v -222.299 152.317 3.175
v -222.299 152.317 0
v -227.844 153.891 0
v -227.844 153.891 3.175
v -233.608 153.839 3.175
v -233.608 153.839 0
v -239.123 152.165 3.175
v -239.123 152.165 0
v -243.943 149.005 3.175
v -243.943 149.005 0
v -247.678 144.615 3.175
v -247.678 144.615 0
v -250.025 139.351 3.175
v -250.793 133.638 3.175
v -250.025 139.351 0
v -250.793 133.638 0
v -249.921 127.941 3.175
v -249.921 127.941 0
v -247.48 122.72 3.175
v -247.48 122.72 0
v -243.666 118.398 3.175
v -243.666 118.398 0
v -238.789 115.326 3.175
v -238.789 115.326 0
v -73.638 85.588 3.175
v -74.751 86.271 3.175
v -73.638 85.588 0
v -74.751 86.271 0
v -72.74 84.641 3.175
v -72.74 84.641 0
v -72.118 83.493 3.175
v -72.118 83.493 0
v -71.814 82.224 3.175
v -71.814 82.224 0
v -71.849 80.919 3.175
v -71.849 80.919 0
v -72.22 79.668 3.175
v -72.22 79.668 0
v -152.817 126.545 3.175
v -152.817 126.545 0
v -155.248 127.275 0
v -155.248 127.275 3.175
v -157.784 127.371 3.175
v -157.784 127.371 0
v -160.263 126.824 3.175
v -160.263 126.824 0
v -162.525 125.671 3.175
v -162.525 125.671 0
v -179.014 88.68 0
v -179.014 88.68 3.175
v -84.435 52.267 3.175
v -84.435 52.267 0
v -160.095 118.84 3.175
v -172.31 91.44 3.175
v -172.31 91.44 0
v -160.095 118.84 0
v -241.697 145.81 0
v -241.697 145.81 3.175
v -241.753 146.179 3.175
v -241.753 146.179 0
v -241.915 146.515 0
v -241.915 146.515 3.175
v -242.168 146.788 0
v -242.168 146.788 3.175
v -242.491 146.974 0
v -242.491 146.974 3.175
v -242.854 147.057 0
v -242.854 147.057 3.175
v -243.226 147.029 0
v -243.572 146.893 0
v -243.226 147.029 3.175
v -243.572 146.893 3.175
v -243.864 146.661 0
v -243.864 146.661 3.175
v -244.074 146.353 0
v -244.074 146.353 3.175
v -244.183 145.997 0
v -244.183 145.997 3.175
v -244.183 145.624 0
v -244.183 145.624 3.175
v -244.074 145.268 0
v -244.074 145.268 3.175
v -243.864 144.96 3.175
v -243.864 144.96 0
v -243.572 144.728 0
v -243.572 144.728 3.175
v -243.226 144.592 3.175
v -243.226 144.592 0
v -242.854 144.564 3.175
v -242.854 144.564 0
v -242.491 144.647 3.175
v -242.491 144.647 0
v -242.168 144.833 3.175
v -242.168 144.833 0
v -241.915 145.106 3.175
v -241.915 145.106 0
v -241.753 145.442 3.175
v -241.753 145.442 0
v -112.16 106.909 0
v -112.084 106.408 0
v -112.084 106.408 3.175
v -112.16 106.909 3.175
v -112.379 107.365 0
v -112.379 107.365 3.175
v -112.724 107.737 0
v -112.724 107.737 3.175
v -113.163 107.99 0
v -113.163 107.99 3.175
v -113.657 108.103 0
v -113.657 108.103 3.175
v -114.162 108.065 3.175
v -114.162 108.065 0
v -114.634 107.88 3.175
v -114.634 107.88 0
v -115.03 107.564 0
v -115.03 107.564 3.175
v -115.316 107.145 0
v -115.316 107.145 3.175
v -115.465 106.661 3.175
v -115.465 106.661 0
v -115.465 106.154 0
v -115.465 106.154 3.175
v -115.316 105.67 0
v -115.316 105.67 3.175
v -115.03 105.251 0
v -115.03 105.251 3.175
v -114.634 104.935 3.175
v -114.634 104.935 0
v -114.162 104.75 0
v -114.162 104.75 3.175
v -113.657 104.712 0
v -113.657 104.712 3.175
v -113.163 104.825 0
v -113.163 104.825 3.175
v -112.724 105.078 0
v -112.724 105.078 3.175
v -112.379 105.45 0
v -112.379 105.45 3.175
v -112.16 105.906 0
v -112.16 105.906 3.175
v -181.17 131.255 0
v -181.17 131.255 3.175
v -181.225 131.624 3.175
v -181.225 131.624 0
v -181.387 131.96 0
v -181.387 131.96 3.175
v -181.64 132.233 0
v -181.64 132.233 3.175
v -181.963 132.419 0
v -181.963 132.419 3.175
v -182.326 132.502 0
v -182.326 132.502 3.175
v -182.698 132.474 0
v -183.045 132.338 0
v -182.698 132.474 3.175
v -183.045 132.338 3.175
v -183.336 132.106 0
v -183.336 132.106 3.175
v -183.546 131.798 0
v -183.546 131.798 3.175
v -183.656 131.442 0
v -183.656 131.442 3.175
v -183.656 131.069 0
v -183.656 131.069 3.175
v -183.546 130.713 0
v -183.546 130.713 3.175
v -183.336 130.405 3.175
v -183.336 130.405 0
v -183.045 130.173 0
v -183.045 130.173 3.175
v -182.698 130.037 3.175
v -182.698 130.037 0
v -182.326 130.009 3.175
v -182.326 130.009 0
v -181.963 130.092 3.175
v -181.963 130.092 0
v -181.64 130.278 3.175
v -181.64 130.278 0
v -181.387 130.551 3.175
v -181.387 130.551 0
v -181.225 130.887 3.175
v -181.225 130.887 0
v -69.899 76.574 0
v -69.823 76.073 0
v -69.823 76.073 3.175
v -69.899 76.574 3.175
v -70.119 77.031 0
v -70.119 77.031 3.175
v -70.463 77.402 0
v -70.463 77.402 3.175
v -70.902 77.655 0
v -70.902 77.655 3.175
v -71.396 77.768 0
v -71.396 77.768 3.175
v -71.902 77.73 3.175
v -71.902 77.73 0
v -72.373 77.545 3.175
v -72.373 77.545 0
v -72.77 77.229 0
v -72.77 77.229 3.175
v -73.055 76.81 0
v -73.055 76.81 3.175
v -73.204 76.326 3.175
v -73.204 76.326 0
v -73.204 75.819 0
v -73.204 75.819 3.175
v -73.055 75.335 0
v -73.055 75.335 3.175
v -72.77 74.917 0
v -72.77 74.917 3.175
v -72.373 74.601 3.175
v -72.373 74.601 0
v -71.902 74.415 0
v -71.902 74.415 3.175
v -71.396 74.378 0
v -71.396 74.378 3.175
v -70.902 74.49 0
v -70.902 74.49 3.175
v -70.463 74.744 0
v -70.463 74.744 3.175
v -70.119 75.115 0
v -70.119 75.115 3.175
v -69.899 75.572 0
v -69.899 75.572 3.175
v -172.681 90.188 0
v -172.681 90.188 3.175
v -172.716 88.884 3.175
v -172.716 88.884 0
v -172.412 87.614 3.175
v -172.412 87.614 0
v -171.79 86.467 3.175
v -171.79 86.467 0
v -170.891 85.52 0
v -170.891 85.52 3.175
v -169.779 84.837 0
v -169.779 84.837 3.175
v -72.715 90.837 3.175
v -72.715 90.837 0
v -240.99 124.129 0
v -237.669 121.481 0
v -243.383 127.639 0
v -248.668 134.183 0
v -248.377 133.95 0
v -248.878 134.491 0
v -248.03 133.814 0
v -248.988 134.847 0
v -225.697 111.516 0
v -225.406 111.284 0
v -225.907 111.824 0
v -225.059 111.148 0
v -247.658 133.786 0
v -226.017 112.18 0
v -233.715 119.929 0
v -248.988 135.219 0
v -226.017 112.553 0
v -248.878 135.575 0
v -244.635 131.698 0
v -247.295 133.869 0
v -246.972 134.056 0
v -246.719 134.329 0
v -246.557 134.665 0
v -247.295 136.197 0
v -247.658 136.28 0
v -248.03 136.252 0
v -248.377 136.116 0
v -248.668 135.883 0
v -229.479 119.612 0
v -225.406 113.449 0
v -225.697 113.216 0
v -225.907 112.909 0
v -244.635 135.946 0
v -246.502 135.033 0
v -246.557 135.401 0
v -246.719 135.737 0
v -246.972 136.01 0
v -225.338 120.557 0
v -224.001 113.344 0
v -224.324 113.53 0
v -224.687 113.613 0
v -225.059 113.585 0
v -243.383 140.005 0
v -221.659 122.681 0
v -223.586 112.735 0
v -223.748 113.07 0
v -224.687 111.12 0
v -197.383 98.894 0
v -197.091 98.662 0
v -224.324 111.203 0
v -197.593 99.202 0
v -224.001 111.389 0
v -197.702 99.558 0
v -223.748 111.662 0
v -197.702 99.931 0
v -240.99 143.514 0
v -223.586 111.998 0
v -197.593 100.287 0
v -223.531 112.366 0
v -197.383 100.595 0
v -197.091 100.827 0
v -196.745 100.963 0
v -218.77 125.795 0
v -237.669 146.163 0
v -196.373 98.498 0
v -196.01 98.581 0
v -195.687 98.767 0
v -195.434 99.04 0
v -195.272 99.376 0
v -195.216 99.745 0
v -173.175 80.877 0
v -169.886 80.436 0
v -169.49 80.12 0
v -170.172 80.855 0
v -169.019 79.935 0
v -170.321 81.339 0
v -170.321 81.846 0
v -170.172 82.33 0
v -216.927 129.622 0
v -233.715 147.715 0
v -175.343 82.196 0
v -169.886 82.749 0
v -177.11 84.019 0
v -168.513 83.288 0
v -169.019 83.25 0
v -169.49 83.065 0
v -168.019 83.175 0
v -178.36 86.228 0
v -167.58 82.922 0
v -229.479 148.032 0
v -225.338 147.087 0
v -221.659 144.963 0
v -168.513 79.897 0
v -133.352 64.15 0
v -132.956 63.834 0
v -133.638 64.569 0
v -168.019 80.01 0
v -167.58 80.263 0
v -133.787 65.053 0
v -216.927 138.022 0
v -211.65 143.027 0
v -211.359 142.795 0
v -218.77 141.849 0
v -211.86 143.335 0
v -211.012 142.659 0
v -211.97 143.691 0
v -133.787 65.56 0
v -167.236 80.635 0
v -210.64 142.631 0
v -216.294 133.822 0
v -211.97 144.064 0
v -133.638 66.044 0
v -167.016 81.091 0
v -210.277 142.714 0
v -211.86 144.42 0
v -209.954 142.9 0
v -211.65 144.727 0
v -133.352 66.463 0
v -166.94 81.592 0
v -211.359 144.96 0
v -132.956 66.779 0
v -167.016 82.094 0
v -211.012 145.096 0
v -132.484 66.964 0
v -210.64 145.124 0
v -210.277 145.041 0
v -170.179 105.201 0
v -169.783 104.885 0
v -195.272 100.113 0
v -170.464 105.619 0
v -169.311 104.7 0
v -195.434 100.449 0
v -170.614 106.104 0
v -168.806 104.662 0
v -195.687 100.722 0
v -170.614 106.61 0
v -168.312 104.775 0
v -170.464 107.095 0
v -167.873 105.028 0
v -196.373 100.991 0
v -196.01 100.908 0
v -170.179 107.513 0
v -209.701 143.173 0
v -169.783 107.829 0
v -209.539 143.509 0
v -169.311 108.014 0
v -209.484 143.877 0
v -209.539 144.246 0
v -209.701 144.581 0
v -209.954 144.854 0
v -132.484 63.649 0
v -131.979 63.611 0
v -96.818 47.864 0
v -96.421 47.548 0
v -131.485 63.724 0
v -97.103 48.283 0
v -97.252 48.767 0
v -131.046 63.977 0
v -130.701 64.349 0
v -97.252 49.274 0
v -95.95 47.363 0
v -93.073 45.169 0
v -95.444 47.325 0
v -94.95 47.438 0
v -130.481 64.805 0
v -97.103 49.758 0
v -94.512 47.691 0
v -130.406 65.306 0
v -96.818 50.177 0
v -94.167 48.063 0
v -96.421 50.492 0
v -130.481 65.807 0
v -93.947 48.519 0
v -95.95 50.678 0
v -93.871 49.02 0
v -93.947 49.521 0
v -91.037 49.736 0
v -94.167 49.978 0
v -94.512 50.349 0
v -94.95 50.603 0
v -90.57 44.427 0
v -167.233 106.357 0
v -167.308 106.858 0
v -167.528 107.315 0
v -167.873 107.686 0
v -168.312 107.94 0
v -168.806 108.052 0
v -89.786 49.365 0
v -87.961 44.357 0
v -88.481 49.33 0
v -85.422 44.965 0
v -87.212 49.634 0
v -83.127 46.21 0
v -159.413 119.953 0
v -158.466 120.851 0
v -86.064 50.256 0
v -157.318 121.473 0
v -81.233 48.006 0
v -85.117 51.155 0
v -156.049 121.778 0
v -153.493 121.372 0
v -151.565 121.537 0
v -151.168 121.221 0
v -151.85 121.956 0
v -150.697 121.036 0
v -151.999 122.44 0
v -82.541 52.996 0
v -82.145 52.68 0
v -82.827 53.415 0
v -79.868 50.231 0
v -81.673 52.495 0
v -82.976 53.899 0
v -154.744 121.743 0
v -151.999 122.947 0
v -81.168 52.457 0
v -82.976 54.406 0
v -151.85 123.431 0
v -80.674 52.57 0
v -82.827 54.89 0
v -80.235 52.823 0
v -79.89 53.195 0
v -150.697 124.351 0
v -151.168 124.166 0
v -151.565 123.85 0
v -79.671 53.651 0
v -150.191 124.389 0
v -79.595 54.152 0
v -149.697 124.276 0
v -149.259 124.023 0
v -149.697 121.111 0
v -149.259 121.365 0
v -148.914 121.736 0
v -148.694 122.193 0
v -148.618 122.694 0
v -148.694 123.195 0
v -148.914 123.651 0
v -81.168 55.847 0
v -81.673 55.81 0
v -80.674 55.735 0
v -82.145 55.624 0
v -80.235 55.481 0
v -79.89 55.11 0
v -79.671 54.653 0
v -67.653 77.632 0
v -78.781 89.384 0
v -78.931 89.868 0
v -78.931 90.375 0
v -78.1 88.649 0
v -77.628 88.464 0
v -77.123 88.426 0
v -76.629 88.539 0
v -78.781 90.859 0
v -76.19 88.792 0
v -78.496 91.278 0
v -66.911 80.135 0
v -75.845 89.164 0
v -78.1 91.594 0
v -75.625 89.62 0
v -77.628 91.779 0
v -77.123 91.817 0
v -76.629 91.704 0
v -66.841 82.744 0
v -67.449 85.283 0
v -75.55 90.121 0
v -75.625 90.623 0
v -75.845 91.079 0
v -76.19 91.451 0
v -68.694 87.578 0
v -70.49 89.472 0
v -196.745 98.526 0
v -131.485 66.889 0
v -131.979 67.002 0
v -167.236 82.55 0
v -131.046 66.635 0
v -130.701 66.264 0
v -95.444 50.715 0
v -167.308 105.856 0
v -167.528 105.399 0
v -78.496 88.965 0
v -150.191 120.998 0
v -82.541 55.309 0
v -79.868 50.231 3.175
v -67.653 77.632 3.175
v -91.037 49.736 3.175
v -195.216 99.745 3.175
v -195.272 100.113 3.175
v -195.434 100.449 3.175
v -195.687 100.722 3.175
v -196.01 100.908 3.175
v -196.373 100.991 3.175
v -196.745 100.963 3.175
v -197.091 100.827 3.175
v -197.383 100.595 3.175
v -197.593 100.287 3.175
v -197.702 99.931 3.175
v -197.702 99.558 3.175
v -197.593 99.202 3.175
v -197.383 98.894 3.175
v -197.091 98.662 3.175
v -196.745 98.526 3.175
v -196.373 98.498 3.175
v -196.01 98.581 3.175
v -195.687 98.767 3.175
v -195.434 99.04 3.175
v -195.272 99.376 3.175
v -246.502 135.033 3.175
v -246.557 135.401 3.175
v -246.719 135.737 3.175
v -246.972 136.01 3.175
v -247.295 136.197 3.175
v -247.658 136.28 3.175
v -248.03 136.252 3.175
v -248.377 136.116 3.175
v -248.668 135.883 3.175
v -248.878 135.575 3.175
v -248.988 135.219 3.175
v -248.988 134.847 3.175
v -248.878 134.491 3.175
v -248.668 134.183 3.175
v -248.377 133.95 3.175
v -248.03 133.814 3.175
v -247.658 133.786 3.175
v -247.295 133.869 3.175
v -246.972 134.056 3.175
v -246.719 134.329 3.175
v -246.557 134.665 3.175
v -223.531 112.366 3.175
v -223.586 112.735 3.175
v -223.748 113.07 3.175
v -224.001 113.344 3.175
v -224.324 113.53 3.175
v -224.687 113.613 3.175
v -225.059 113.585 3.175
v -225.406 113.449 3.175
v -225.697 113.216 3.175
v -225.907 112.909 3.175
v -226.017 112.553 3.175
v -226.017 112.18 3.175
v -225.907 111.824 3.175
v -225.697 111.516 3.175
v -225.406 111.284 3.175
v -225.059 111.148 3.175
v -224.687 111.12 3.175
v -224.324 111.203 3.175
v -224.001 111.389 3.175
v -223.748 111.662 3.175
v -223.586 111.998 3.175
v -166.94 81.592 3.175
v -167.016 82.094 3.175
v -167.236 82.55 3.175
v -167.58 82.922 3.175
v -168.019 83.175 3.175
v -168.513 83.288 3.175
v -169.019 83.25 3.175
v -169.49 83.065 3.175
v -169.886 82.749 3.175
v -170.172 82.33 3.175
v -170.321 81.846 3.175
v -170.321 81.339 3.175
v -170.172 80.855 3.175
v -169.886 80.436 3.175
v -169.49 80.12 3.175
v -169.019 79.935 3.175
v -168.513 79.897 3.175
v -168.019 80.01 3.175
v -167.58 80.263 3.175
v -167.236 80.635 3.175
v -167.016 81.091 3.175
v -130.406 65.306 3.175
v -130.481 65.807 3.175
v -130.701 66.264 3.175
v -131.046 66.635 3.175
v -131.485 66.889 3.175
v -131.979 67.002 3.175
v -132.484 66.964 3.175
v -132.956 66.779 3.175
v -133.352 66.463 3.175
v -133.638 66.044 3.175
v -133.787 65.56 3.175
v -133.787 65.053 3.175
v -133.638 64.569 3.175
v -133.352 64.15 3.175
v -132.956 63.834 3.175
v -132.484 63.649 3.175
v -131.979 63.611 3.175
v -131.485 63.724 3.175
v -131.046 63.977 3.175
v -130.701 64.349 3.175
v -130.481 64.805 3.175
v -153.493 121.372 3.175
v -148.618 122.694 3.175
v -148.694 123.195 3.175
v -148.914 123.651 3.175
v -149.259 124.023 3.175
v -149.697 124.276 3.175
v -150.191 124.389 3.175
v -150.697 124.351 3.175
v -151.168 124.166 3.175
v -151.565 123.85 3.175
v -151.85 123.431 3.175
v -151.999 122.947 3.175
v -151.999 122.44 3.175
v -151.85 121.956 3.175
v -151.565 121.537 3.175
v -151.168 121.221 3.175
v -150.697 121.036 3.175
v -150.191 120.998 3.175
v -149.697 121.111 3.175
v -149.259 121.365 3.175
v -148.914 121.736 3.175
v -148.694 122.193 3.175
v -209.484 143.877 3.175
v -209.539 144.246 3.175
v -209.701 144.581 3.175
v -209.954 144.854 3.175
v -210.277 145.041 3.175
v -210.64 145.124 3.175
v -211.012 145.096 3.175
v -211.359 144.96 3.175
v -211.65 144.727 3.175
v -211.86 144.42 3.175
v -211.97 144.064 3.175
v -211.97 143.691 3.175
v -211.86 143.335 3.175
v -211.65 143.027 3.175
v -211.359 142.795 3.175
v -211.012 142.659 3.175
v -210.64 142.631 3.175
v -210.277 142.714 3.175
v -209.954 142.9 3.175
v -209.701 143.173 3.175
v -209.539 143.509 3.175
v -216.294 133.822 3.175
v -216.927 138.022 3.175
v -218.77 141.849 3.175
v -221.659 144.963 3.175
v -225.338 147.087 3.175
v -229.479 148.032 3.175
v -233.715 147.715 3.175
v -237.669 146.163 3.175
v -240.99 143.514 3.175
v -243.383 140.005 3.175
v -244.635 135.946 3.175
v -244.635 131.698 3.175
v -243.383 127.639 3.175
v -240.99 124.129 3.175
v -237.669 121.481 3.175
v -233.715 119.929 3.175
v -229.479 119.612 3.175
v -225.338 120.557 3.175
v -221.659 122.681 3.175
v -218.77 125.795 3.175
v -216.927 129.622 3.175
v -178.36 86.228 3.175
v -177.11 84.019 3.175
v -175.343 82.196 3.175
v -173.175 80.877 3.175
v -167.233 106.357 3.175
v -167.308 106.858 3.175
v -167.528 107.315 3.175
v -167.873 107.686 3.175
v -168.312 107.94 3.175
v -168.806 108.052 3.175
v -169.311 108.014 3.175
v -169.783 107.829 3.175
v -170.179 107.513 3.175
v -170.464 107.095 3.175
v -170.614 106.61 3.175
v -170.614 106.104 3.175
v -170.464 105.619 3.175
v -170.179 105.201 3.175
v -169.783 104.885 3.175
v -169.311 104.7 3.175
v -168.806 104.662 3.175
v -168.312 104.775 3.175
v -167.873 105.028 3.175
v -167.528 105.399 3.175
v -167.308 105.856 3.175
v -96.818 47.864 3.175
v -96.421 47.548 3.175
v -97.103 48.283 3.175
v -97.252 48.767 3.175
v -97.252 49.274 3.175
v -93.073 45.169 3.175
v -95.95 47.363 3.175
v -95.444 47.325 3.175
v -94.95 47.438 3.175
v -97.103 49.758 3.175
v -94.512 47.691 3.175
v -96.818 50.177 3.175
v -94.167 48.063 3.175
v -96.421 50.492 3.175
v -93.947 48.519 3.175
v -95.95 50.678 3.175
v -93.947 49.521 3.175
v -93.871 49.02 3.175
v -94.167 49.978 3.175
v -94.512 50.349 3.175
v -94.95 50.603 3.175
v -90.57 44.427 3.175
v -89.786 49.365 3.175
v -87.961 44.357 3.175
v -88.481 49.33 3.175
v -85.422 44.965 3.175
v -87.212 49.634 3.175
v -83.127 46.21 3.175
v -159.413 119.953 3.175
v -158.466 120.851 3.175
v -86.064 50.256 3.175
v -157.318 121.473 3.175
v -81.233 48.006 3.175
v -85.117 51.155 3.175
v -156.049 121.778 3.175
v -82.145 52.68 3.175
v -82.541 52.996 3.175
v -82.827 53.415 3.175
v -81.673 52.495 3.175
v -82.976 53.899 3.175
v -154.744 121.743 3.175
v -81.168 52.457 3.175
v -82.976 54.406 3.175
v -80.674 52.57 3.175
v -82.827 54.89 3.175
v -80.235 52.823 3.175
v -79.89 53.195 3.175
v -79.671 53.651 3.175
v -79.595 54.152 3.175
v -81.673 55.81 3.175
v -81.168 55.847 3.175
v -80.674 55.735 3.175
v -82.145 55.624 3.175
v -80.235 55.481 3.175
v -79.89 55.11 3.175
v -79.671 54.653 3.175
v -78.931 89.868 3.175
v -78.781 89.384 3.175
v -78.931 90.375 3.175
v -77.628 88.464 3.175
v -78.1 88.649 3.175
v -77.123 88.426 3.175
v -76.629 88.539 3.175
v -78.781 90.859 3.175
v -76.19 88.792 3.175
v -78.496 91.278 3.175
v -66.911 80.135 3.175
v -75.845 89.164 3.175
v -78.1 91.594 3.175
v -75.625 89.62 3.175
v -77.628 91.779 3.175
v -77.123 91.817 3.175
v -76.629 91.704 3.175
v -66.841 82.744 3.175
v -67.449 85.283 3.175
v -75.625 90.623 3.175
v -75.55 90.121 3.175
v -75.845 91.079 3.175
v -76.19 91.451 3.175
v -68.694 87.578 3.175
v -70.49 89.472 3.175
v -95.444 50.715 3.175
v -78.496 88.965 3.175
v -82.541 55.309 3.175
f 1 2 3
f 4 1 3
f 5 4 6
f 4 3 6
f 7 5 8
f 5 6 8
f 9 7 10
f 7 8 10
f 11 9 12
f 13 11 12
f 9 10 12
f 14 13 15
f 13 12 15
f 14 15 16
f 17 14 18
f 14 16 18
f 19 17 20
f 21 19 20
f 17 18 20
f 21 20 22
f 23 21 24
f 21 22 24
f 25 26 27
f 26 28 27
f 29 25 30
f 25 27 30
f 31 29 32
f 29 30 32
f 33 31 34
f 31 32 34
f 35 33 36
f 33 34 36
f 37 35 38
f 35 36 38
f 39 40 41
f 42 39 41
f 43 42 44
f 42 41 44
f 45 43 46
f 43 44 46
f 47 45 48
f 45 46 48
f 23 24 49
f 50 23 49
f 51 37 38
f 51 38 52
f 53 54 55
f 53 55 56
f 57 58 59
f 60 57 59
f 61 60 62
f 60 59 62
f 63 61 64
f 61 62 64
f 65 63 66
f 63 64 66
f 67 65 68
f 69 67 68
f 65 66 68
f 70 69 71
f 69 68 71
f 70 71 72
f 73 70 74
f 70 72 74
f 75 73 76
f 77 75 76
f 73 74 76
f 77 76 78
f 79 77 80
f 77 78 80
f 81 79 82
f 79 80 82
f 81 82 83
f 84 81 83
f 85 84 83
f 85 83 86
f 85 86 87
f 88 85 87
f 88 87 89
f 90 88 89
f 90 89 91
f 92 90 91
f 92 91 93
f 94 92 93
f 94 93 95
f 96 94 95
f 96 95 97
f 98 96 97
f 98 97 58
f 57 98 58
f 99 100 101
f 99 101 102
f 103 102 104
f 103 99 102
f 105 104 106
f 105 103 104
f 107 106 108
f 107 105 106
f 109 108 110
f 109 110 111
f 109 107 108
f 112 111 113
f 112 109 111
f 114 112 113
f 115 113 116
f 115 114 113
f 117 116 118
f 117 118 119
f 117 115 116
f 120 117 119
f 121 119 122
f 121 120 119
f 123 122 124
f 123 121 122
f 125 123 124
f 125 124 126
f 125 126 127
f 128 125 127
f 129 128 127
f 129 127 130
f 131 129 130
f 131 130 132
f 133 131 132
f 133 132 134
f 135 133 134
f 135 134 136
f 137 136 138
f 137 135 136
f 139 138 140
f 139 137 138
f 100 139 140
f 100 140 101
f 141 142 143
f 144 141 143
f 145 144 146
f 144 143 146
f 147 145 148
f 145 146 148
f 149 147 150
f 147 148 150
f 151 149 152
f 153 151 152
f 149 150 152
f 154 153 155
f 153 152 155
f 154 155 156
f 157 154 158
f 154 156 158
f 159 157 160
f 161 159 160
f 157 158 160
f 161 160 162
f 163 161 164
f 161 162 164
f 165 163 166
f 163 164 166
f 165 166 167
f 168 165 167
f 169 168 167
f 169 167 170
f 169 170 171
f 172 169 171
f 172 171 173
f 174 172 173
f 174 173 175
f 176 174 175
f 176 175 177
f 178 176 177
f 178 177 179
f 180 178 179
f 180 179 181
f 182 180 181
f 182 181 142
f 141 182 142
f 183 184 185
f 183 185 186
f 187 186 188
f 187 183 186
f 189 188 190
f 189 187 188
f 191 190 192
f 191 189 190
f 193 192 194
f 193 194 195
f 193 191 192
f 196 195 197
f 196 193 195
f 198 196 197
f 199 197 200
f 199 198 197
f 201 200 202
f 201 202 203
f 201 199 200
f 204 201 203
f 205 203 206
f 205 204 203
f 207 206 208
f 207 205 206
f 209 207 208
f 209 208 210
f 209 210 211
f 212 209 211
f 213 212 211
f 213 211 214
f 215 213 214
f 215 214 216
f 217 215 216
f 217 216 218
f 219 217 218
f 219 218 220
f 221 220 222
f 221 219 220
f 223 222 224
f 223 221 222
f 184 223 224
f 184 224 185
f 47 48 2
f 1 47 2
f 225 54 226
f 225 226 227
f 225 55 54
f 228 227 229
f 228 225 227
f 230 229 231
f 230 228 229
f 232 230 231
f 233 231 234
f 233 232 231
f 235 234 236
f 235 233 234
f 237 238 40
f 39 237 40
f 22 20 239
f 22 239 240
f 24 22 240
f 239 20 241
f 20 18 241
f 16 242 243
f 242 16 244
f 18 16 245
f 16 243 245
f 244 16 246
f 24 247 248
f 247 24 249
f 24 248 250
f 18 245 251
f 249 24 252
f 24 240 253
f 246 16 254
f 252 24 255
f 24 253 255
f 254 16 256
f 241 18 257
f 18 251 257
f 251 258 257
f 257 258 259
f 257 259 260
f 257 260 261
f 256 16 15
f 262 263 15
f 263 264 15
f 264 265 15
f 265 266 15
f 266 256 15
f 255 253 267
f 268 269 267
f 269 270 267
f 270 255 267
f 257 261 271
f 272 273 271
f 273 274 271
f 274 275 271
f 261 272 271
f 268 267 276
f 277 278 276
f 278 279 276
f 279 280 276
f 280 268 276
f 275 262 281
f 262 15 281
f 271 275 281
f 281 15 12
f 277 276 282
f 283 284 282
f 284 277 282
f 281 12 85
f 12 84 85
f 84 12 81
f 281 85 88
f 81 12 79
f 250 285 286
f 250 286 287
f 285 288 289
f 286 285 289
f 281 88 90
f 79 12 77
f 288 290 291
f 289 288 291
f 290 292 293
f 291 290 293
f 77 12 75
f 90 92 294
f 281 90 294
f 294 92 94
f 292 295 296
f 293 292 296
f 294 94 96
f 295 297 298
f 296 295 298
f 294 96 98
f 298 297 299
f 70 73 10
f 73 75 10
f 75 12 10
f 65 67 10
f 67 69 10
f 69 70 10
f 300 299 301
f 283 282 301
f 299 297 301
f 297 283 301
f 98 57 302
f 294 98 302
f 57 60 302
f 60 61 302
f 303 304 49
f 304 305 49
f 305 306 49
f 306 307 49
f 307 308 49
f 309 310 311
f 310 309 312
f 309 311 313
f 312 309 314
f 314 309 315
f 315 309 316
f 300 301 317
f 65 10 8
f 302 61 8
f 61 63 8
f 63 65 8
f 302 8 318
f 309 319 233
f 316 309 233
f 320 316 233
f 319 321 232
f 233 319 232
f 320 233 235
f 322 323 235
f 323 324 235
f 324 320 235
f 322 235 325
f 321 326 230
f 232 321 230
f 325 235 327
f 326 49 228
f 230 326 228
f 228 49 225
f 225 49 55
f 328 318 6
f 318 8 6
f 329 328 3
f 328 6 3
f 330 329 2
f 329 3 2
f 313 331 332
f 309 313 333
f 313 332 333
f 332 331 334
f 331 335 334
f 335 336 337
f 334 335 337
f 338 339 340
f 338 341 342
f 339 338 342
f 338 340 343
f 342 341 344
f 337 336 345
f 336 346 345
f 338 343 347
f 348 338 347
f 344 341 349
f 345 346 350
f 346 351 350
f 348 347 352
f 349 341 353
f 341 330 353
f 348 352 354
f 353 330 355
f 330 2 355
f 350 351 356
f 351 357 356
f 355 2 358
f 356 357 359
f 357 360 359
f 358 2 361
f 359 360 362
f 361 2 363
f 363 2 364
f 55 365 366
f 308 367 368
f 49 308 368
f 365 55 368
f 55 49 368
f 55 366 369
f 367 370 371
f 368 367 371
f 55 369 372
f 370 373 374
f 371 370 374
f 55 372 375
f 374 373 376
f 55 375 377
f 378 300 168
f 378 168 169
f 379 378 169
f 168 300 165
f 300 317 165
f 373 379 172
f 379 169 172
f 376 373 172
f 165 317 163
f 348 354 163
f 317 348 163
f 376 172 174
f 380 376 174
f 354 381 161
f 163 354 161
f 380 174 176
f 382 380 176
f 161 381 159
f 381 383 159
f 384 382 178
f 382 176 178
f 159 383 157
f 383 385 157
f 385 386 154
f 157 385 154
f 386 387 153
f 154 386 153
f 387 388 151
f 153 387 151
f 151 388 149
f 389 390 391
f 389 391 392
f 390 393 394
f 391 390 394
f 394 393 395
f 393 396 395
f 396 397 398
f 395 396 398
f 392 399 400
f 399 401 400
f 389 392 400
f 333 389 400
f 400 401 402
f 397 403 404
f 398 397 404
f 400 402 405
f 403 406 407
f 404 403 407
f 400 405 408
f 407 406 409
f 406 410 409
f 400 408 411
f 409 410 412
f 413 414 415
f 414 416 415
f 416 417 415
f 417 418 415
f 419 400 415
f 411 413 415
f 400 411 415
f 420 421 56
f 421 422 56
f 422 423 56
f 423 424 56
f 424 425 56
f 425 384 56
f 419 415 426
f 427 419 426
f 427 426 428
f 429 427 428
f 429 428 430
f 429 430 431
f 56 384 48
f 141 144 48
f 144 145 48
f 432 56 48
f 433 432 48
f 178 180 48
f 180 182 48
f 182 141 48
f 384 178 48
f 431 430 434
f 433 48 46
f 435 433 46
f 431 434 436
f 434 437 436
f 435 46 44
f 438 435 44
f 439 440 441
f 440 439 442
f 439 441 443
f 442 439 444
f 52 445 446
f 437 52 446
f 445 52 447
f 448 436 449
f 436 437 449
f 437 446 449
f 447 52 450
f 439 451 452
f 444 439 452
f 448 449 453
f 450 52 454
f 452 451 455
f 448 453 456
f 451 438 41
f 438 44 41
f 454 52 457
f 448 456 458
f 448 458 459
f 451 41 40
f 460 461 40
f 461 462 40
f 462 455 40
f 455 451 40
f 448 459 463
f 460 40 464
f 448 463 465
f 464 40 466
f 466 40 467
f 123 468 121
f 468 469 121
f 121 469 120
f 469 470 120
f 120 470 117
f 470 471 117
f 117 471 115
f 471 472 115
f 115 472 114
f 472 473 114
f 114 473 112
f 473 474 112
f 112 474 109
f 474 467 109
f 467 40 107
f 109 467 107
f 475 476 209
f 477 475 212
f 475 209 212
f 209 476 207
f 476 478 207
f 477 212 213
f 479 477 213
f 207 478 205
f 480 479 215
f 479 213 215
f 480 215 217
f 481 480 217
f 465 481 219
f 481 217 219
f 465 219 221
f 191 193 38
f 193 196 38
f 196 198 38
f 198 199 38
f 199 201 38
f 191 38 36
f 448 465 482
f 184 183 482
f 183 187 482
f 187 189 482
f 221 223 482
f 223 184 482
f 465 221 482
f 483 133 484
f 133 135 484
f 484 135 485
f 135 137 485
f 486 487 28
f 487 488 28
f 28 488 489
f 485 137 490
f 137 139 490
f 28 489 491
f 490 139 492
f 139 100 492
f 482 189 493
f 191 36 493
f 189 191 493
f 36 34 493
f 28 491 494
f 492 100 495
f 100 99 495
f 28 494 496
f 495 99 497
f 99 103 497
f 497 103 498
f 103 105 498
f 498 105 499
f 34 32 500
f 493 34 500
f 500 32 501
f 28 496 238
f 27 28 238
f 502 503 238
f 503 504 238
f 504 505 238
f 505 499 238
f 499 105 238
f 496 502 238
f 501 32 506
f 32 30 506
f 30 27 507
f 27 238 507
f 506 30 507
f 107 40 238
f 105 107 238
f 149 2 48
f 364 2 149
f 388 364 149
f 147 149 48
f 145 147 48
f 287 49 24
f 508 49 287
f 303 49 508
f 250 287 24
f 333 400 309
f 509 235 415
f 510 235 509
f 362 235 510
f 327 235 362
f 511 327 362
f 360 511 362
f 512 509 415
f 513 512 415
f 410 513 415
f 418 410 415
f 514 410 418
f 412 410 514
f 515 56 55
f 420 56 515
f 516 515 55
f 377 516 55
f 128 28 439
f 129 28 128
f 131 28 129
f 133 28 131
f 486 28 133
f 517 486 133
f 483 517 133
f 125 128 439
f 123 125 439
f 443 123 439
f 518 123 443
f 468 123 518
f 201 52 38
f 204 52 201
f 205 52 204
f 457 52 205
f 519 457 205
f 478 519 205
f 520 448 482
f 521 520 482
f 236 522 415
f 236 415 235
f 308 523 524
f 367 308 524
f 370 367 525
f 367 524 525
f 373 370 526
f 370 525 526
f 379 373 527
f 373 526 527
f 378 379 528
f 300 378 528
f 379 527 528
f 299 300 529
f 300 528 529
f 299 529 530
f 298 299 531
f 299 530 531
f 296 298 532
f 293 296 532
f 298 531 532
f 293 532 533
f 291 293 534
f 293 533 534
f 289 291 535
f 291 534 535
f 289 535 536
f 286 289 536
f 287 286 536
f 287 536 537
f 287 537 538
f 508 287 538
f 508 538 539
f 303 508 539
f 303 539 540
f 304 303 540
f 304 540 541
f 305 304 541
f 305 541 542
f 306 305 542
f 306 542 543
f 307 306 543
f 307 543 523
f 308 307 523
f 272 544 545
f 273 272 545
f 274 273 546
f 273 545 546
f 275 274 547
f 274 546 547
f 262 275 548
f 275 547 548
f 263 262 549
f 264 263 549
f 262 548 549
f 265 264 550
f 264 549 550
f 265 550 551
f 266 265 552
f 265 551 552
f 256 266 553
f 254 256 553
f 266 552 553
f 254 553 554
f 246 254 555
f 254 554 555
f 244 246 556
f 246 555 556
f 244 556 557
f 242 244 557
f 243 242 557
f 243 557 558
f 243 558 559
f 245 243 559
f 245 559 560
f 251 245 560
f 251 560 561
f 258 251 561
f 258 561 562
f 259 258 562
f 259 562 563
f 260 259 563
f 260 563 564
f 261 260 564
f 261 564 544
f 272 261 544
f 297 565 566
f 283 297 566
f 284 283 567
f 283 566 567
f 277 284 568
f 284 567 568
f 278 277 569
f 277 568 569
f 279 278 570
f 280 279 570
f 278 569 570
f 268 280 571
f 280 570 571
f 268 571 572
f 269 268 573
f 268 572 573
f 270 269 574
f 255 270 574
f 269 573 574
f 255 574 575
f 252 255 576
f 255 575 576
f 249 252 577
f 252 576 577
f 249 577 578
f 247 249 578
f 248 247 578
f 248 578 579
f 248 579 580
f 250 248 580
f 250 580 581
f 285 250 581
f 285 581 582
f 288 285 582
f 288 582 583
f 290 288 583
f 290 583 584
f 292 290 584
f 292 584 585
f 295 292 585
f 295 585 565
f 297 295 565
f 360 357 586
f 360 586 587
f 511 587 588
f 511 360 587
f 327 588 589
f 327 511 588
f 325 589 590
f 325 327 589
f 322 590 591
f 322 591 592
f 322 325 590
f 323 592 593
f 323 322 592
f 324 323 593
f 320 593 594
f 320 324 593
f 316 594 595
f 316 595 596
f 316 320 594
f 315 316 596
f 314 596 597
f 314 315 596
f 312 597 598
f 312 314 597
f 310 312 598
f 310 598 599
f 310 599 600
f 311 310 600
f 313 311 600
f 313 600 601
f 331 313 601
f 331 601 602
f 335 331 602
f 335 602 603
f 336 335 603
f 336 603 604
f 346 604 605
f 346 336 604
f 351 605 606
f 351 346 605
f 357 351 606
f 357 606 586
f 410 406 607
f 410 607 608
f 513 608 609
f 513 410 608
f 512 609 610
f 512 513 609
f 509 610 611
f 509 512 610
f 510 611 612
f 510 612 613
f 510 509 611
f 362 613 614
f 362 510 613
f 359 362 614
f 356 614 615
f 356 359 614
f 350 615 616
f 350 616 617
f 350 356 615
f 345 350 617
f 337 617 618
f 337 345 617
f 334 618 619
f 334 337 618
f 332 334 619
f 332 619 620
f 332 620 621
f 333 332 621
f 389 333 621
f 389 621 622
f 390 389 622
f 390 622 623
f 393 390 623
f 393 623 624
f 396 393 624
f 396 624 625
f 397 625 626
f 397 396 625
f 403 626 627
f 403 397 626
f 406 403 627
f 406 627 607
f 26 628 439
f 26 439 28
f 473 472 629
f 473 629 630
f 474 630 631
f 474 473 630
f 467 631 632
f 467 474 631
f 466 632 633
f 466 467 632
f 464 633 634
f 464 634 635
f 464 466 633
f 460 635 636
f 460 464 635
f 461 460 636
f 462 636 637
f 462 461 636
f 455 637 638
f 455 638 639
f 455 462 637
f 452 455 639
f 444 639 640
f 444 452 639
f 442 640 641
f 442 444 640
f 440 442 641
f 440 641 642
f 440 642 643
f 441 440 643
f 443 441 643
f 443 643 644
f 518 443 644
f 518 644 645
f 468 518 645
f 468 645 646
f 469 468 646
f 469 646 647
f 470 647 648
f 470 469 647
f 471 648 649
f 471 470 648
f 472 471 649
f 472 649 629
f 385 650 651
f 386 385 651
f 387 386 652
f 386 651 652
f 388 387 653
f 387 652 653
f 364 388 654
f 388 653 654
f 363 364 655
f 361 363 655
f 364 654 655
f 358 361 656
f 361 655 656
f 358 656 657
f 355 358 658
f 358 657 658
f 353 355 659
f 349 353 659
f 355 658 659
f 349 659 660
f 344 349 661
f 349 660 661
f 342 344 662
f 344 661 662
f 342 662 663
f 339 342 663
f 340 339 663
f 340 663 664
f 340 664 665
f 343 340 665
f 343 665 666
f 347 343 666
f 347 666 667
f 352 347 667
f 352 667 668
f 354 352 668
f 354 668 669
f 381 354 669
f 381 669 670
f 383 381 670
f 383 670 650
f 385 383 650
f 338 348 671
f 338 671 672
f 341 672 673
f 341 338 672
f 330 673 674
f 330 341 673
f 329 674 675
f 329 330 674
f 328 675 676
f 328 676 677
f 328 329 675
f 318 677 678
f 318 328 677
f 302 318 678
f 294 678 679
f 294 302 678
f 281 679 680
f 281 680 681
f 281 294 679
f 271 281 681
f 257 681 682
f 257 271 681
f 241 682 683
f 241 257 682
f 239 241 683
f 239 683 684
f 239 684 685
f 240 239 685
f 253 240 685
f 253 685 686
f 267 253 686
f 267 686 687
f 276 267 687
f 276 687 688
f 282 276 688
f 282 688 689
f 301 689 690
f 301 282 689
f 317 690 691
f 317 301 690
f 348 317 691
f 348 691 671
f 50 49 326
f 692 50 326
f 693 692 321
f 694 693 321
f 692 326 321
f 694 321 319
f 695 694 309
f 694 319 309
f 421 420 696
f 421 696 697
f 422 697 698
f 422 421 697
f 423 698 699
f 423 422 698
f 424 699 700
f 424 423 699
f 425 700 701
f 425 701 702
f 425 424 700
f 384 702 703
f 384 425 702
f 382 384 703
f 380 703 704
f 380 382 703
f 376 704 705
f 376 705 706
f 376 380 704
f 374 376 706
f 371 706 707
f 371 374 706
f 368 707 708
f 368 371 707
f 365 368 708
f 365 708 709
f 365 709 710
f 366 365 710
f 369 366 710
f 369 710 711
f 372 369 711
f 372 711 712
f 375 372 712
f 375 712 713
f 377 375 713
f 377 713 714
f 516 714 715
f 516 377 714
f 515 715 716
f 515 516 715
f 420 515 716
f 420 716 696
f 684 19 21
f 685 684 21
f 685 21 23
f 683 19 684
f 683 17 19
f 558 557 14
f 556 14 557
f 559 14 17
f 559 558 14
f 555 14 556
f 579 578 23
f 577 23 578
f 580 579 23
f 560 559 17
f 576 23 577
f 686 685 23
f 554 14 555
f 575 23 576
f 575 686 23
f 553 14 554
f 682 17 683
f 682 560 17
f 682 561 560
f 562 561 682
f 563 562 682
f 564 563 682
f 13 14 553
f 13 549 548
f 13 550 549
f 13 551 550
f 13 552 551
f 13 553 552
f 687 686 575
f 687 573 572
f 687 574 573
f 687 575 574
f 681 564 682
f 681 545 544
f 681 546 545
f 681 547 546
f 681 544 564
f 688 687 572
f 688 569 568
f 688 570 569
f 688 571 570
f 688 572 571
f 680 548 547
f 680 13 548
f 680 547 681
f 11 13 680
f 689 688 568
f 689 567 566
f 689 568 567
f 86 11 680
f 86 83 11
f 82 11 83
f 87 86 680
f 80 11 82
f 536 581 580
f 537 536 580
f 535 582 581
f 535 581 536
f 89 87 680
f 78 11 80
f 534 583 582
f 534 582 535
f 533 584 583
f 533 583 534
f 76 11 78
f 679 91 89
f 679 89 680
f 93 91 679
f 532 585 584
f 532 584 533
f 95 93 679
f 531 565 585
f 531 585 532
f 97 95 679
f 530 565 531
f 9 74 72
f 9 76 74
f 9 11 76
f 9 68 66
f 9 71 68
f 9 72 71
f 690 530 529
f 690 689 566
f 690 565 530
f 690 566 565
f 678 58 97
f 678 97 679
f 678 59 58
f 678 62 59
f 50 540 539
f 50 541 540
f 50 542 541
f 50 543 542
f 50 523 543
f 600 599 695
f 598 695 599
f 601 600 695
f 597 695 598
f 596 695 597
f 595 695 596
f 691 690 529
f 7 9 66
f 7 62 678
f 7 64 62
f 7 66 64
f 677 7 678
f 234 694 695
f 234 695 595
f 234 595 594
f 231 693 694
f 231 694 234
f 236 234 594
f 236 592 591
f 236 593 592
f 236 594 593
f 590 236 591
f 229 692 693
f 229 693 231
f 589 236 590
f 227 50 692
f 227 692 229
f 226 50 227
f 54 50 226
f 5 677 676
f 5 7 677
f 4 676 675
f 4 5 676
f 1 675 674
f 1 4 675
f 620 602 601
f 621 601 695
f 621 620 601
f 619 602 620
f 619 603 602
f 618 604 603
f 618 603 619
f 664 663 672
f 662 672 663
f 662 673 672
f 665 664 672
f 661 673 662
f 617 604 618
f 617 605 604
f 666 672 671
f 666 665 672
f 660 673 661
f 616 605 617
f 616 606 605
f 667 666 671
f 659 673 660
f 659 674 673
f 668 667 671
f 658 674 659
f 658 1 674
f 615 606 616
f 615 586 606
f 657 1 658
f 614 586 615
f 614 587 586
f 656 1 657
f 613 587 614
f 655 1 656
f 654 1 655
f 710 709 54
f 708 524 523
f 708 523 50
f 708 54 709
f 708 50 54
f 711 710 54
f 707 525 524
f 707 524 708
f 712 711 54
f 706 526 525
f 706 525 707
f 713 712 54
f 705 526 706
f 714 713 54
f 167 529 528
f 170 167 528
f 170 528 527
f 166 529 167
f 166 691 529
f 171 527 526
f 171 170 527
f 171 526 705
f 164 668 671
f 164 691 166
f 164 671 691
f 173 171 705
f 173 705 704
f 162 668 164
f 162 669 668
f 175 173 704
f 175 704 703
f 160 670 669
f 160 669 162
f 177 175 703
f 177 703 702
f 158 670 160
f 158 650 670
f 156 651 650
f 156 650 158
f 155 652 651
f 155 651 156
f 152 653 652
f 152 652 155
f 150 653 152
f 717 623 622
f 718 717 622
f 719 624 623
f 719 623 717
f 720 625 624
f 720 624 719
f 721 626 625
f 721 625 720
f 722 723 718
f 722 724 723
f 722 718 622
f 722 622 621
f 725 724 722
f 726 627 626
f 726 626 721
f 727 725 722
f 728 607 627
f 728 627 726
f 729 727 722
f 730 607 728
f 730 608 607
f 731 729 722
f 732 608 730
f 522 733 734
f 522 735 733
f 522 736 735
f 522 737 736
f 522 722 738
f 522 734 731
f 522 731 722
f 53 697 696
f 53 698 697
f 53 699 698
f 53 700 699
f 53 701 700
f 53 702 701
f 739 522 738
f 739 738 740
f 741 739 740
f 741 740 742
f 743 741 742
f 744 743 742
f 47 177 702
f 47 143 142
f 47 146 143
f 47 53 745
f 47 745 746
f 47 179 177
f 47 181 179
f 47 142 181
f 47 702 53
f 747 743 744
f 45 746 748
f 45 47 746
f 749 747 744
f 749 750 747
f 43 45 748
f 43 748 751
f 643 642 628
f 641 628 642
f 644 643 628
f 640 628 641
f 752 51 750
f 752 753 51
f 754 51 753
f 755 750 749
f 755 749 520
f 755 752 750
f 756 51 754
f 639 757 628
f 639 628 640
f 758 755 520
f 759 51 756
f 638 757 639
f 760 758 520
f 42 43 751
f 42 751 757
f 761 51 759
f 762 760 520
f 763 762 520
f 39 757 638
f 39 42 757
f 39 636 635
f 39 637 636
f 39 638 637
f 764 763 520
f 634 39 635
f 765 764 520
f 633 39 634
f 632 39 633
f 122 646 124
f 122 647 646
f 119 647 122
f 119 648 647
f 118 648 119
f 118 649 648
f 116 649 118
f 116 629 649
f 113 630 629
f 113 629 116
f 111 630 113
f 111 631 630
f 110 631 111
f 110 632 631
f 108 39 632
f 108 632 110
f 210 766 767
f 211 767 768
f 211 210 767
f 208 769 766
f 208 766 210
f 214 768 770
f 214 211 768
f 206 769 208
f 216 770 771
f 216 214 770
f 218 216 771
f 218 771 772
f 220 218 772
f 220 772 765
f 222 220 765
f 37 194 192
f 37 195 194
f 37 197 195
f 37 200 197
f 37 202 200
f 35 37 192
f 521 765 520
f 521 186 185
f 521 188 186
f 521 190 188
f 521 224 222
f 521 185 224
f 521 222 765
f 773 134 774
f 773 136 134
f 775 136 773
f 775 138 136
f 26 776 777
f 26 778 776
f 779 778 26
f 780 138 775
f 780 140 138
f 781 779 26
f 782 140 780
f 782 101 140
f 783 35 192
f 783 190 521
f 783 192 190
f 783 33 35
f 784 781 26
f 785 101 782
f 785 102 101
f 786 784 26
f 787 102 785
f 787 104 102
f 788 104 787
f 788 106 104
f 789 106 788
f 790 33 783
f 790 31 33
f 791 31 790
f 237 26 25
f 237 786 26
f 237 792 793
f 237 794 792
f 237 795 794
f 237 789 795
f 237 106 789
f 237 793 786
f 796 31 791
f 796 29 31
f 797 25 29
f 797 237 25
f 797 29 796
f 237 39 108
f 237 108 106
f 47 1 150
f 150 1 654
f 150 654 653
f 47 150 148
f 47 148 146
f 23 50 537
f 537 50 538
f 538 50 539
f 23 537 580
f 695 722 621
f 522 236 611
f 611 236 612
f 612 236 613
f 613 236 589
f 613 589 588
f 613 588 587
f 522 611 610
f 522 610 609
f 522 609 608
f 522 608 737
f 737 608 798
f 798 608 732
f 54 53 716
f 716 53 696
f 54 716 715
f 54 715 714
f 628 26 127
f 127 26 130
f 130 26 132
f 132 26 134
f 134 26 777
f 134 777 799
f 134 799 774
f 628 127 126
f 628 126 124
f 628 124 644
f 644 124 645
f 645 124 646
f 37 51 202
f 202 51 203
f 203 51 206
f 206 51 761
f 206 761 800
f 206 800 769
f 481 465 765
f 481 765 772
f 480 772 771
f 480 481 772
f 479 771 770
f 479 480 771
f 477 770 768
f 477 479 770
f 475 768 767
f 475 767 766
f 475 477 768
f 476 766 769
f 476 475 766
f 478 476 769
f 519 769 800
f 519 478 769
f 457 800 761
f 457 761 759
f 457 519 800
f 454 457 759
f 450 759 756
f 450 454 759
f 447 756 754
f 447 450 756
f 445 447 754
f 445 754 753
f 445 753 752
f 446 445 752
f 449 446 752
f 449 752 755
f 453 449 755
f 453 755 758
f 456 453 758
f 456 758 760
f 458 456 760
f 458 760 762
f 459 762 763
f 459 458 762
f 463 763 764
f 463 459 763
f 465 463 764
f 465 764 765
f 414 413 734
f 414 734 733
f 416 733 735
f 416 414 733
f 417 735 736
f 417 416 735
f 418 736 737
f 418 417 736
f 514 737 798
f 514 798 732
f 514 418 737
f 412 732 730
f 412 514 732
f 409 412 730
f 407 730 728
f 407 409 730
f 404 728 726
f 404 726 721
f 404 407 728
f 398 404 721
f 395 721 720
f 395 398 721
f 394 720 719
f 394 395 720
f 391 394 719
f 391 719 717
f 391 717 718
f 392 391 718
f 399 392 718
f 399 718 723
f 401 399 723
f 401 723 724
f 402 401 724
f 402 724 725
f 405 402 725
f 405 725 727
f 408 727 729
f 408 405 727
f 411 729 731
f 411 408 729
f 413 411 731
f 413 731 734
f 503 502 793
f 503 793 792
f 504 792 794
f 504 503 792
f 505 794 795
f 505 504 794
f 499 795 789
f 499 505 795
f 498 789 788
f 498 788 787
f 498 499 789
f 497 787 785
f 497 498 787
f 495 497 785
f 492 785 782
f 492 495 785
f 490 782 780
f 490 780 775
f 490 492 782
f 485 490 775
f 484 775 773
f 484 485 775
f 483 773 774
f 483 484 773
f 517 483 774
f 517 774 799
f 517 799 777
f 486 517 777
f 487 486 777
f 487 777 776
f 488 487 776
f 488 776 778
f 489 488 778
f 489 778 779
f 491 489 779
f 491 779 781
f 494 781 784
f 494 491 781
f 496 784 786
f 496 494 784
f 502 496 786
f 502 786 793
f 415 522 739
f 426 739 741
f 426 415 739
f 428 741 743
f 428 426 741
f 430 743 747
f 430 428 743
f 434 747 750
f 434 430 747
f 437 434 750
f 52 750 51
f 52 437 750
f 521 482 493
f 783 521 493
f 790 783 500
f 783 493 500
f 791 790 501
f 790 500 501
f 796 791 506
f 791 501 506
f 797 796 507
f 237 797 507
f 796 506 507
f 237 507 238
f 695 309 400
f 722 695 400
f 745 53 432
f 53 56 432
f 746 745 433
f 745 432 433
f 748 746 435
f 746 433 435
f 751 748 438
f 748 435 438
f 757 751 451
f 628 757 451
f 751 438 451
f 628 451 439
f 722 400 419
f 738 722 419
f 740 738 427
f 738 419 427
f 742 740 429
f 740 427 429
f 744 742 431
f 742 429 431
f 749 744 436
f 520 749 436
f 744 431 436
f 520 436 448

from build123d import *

# Parameters (mm, degrees)
SKETCH1_R           = 14.25
SKETCH1_R_2         = 1.7
BOSS_EXTRUDE1_DEPTH = 3.175
SKETCH5_R           = 1.25
CUT_EXTRUDE4_DEPTH  = 4.175
CUT_EXTRUDE5_DEPTH  = 10
FILLET1_R           = 5
FILLET2_R           = 5


with BuildPart() as part:
    # Sketch1 → Boss-Extrude1 (new body)
    with BuildSketch(Plane.XY):
        with BuildLine():
            Line((-72.715301765, 90.837326721), (-152.817002247, 126.544575004))
            ThreePointArc((-152.817002247, 126.544575004), (-157.784388135, 127.370762315), (-162.524605276, 125.671394934))
            Line((-162.524605276, 125.671394934), (-222.299360222, 152.317421212))
            ThreePointArc((-222.299360222, 152.317421212), (-249.039738928, 142.066706765), (-238.78902448, 115.326328059))
            Line((-238.78902448, 115.326328059), (-179.014269534, 88.680301782))
            ThreePointArc((-179.014269534, 88.680301782), (-177.109561802, 84.018800254), (-173.174612442, 80.876558766))
            Line((-173.174612442, 80.876558766), (-93.072911961, 45.169310483))
            ThreePointArc((-93.072911961, 45.169310483), (-85.421957972, 44.965480094), (-79.867786674, 50.231391692))
            Line((-79.867786674, 50.231391692), (-67.653220557, 77.632201435))
            ThreePointArc((-67.653220557, 77.632201435), (-67.449390168, 85.283155423), (-72.715301765, 90.837326721))
        make_face()
        with Locations((-230.544192351, 133.821874636)):
            Circle(SKETCH1_R, mode=Mode.SUBTRACT)
        with Locations((-95.571468701, 49.02024728)):
            Circle(SKETCH1_R_2, mode=Mode.SUBTRACT)
        with Locations((-132.105881692, 65.306335437)):
            Circle(SKETCH1_R_2, mode=Mode.SUBTRACT)
        with Locations((-168.640294682, 81.592423593)):
            Circle(SKETCH1_R_2, mode=Mode.SUBTRACT)
        with Locations((-150.318445506, 122.693638207)):
            Circle(SKETCH1_R_2, mode=Mode.SUBTRACT)
        with Locations((-113.784032516, 106.407550051)):
            Circle(SKETCH1_R_2, mode=Mode.SUBTRACT)
        with Locations((-77.249619525, 90.121461895)):
            Circle(SKETCH1_R_2, mode=Mode.SUBTRACT)
        with Locations((-81.295075004, 54.152214057)):
            Circle(SKETCH1_R_2, mode=Mode.SUBTRACT)
        with Locations((-71.52342211, 76.072861852)):
            Circle(SKETCH1_R_2, mode=Mode.SUBTRACT)
        with Locations((-168.932649456, 106.357056211)):
            Circle(SKETCH1_R_2, mode=Mode.SUBTRACT)
    extrude(amount=BOSS_EXTRUDE1_DEPTH)

    # Sketch5 → Cut-Extrude4 (cut, through all)
    with BuildSketch(Plane.XY.offset(3.175)):
        with Locations((-196.466353254, 99.744559857)):
            Circle(SKETCH5_R)
        with Locations((-224.780523322, 112.366278179)):
            Circle(SKETCH5_R)
        with Locations((-210.733772287, 143.877209383)):
            Circle(SKETCH5_R)
        with Locations((-182.419602219, 131.255491062)):
            Circle(SKETCH5_R)
        with Locations((-242.947351213, 145.810375386)):
            Circle(SKETCH5_R)
        with Locations((-247.751623016, 135.033002179)):
            Circle(SKETCH5_R)
    extrude(amount=-CUT_EXTRUDE4_DEPTH, mode=Mode.SUBTRACT)

    # Sketch6 → Cut-Extrude5 (cut)
    with BuildSketch(Plane.XY.offset(3.175)):
        Polygon((-158.059591703, 123.407293834), (-70.184261161, 84.234764078), (-86.470349317, 47.700351088), (-174.345679859, 86.872880843), align=None)
    extrude(amount=-CUT_EXTRUDE5_DEPTH, mode=Mode.SUBTRACT)

    # Fillet1
    fillet1_edges = [part.edges().sort_by_distance(p)[0] for p in [
        (-174.345679859, 86.872880843, 1.5875),
        (-158.059591703, 123.407293834, 1.5875),
    ]]
    fillet(fillet1_edges, radius=FILLET1_R)

    # Fillet2
    fillet2_edges = [part.edges().sort_by_distance(p)[0] for p in [
        (-70.184261161, 84.234764078, 1.5875),
        (-86.470349317, 47.700351088, 1.5875),
    ]]
    fillet(fillet2_edges, radius=FILLET2_R)


solid = part.part
